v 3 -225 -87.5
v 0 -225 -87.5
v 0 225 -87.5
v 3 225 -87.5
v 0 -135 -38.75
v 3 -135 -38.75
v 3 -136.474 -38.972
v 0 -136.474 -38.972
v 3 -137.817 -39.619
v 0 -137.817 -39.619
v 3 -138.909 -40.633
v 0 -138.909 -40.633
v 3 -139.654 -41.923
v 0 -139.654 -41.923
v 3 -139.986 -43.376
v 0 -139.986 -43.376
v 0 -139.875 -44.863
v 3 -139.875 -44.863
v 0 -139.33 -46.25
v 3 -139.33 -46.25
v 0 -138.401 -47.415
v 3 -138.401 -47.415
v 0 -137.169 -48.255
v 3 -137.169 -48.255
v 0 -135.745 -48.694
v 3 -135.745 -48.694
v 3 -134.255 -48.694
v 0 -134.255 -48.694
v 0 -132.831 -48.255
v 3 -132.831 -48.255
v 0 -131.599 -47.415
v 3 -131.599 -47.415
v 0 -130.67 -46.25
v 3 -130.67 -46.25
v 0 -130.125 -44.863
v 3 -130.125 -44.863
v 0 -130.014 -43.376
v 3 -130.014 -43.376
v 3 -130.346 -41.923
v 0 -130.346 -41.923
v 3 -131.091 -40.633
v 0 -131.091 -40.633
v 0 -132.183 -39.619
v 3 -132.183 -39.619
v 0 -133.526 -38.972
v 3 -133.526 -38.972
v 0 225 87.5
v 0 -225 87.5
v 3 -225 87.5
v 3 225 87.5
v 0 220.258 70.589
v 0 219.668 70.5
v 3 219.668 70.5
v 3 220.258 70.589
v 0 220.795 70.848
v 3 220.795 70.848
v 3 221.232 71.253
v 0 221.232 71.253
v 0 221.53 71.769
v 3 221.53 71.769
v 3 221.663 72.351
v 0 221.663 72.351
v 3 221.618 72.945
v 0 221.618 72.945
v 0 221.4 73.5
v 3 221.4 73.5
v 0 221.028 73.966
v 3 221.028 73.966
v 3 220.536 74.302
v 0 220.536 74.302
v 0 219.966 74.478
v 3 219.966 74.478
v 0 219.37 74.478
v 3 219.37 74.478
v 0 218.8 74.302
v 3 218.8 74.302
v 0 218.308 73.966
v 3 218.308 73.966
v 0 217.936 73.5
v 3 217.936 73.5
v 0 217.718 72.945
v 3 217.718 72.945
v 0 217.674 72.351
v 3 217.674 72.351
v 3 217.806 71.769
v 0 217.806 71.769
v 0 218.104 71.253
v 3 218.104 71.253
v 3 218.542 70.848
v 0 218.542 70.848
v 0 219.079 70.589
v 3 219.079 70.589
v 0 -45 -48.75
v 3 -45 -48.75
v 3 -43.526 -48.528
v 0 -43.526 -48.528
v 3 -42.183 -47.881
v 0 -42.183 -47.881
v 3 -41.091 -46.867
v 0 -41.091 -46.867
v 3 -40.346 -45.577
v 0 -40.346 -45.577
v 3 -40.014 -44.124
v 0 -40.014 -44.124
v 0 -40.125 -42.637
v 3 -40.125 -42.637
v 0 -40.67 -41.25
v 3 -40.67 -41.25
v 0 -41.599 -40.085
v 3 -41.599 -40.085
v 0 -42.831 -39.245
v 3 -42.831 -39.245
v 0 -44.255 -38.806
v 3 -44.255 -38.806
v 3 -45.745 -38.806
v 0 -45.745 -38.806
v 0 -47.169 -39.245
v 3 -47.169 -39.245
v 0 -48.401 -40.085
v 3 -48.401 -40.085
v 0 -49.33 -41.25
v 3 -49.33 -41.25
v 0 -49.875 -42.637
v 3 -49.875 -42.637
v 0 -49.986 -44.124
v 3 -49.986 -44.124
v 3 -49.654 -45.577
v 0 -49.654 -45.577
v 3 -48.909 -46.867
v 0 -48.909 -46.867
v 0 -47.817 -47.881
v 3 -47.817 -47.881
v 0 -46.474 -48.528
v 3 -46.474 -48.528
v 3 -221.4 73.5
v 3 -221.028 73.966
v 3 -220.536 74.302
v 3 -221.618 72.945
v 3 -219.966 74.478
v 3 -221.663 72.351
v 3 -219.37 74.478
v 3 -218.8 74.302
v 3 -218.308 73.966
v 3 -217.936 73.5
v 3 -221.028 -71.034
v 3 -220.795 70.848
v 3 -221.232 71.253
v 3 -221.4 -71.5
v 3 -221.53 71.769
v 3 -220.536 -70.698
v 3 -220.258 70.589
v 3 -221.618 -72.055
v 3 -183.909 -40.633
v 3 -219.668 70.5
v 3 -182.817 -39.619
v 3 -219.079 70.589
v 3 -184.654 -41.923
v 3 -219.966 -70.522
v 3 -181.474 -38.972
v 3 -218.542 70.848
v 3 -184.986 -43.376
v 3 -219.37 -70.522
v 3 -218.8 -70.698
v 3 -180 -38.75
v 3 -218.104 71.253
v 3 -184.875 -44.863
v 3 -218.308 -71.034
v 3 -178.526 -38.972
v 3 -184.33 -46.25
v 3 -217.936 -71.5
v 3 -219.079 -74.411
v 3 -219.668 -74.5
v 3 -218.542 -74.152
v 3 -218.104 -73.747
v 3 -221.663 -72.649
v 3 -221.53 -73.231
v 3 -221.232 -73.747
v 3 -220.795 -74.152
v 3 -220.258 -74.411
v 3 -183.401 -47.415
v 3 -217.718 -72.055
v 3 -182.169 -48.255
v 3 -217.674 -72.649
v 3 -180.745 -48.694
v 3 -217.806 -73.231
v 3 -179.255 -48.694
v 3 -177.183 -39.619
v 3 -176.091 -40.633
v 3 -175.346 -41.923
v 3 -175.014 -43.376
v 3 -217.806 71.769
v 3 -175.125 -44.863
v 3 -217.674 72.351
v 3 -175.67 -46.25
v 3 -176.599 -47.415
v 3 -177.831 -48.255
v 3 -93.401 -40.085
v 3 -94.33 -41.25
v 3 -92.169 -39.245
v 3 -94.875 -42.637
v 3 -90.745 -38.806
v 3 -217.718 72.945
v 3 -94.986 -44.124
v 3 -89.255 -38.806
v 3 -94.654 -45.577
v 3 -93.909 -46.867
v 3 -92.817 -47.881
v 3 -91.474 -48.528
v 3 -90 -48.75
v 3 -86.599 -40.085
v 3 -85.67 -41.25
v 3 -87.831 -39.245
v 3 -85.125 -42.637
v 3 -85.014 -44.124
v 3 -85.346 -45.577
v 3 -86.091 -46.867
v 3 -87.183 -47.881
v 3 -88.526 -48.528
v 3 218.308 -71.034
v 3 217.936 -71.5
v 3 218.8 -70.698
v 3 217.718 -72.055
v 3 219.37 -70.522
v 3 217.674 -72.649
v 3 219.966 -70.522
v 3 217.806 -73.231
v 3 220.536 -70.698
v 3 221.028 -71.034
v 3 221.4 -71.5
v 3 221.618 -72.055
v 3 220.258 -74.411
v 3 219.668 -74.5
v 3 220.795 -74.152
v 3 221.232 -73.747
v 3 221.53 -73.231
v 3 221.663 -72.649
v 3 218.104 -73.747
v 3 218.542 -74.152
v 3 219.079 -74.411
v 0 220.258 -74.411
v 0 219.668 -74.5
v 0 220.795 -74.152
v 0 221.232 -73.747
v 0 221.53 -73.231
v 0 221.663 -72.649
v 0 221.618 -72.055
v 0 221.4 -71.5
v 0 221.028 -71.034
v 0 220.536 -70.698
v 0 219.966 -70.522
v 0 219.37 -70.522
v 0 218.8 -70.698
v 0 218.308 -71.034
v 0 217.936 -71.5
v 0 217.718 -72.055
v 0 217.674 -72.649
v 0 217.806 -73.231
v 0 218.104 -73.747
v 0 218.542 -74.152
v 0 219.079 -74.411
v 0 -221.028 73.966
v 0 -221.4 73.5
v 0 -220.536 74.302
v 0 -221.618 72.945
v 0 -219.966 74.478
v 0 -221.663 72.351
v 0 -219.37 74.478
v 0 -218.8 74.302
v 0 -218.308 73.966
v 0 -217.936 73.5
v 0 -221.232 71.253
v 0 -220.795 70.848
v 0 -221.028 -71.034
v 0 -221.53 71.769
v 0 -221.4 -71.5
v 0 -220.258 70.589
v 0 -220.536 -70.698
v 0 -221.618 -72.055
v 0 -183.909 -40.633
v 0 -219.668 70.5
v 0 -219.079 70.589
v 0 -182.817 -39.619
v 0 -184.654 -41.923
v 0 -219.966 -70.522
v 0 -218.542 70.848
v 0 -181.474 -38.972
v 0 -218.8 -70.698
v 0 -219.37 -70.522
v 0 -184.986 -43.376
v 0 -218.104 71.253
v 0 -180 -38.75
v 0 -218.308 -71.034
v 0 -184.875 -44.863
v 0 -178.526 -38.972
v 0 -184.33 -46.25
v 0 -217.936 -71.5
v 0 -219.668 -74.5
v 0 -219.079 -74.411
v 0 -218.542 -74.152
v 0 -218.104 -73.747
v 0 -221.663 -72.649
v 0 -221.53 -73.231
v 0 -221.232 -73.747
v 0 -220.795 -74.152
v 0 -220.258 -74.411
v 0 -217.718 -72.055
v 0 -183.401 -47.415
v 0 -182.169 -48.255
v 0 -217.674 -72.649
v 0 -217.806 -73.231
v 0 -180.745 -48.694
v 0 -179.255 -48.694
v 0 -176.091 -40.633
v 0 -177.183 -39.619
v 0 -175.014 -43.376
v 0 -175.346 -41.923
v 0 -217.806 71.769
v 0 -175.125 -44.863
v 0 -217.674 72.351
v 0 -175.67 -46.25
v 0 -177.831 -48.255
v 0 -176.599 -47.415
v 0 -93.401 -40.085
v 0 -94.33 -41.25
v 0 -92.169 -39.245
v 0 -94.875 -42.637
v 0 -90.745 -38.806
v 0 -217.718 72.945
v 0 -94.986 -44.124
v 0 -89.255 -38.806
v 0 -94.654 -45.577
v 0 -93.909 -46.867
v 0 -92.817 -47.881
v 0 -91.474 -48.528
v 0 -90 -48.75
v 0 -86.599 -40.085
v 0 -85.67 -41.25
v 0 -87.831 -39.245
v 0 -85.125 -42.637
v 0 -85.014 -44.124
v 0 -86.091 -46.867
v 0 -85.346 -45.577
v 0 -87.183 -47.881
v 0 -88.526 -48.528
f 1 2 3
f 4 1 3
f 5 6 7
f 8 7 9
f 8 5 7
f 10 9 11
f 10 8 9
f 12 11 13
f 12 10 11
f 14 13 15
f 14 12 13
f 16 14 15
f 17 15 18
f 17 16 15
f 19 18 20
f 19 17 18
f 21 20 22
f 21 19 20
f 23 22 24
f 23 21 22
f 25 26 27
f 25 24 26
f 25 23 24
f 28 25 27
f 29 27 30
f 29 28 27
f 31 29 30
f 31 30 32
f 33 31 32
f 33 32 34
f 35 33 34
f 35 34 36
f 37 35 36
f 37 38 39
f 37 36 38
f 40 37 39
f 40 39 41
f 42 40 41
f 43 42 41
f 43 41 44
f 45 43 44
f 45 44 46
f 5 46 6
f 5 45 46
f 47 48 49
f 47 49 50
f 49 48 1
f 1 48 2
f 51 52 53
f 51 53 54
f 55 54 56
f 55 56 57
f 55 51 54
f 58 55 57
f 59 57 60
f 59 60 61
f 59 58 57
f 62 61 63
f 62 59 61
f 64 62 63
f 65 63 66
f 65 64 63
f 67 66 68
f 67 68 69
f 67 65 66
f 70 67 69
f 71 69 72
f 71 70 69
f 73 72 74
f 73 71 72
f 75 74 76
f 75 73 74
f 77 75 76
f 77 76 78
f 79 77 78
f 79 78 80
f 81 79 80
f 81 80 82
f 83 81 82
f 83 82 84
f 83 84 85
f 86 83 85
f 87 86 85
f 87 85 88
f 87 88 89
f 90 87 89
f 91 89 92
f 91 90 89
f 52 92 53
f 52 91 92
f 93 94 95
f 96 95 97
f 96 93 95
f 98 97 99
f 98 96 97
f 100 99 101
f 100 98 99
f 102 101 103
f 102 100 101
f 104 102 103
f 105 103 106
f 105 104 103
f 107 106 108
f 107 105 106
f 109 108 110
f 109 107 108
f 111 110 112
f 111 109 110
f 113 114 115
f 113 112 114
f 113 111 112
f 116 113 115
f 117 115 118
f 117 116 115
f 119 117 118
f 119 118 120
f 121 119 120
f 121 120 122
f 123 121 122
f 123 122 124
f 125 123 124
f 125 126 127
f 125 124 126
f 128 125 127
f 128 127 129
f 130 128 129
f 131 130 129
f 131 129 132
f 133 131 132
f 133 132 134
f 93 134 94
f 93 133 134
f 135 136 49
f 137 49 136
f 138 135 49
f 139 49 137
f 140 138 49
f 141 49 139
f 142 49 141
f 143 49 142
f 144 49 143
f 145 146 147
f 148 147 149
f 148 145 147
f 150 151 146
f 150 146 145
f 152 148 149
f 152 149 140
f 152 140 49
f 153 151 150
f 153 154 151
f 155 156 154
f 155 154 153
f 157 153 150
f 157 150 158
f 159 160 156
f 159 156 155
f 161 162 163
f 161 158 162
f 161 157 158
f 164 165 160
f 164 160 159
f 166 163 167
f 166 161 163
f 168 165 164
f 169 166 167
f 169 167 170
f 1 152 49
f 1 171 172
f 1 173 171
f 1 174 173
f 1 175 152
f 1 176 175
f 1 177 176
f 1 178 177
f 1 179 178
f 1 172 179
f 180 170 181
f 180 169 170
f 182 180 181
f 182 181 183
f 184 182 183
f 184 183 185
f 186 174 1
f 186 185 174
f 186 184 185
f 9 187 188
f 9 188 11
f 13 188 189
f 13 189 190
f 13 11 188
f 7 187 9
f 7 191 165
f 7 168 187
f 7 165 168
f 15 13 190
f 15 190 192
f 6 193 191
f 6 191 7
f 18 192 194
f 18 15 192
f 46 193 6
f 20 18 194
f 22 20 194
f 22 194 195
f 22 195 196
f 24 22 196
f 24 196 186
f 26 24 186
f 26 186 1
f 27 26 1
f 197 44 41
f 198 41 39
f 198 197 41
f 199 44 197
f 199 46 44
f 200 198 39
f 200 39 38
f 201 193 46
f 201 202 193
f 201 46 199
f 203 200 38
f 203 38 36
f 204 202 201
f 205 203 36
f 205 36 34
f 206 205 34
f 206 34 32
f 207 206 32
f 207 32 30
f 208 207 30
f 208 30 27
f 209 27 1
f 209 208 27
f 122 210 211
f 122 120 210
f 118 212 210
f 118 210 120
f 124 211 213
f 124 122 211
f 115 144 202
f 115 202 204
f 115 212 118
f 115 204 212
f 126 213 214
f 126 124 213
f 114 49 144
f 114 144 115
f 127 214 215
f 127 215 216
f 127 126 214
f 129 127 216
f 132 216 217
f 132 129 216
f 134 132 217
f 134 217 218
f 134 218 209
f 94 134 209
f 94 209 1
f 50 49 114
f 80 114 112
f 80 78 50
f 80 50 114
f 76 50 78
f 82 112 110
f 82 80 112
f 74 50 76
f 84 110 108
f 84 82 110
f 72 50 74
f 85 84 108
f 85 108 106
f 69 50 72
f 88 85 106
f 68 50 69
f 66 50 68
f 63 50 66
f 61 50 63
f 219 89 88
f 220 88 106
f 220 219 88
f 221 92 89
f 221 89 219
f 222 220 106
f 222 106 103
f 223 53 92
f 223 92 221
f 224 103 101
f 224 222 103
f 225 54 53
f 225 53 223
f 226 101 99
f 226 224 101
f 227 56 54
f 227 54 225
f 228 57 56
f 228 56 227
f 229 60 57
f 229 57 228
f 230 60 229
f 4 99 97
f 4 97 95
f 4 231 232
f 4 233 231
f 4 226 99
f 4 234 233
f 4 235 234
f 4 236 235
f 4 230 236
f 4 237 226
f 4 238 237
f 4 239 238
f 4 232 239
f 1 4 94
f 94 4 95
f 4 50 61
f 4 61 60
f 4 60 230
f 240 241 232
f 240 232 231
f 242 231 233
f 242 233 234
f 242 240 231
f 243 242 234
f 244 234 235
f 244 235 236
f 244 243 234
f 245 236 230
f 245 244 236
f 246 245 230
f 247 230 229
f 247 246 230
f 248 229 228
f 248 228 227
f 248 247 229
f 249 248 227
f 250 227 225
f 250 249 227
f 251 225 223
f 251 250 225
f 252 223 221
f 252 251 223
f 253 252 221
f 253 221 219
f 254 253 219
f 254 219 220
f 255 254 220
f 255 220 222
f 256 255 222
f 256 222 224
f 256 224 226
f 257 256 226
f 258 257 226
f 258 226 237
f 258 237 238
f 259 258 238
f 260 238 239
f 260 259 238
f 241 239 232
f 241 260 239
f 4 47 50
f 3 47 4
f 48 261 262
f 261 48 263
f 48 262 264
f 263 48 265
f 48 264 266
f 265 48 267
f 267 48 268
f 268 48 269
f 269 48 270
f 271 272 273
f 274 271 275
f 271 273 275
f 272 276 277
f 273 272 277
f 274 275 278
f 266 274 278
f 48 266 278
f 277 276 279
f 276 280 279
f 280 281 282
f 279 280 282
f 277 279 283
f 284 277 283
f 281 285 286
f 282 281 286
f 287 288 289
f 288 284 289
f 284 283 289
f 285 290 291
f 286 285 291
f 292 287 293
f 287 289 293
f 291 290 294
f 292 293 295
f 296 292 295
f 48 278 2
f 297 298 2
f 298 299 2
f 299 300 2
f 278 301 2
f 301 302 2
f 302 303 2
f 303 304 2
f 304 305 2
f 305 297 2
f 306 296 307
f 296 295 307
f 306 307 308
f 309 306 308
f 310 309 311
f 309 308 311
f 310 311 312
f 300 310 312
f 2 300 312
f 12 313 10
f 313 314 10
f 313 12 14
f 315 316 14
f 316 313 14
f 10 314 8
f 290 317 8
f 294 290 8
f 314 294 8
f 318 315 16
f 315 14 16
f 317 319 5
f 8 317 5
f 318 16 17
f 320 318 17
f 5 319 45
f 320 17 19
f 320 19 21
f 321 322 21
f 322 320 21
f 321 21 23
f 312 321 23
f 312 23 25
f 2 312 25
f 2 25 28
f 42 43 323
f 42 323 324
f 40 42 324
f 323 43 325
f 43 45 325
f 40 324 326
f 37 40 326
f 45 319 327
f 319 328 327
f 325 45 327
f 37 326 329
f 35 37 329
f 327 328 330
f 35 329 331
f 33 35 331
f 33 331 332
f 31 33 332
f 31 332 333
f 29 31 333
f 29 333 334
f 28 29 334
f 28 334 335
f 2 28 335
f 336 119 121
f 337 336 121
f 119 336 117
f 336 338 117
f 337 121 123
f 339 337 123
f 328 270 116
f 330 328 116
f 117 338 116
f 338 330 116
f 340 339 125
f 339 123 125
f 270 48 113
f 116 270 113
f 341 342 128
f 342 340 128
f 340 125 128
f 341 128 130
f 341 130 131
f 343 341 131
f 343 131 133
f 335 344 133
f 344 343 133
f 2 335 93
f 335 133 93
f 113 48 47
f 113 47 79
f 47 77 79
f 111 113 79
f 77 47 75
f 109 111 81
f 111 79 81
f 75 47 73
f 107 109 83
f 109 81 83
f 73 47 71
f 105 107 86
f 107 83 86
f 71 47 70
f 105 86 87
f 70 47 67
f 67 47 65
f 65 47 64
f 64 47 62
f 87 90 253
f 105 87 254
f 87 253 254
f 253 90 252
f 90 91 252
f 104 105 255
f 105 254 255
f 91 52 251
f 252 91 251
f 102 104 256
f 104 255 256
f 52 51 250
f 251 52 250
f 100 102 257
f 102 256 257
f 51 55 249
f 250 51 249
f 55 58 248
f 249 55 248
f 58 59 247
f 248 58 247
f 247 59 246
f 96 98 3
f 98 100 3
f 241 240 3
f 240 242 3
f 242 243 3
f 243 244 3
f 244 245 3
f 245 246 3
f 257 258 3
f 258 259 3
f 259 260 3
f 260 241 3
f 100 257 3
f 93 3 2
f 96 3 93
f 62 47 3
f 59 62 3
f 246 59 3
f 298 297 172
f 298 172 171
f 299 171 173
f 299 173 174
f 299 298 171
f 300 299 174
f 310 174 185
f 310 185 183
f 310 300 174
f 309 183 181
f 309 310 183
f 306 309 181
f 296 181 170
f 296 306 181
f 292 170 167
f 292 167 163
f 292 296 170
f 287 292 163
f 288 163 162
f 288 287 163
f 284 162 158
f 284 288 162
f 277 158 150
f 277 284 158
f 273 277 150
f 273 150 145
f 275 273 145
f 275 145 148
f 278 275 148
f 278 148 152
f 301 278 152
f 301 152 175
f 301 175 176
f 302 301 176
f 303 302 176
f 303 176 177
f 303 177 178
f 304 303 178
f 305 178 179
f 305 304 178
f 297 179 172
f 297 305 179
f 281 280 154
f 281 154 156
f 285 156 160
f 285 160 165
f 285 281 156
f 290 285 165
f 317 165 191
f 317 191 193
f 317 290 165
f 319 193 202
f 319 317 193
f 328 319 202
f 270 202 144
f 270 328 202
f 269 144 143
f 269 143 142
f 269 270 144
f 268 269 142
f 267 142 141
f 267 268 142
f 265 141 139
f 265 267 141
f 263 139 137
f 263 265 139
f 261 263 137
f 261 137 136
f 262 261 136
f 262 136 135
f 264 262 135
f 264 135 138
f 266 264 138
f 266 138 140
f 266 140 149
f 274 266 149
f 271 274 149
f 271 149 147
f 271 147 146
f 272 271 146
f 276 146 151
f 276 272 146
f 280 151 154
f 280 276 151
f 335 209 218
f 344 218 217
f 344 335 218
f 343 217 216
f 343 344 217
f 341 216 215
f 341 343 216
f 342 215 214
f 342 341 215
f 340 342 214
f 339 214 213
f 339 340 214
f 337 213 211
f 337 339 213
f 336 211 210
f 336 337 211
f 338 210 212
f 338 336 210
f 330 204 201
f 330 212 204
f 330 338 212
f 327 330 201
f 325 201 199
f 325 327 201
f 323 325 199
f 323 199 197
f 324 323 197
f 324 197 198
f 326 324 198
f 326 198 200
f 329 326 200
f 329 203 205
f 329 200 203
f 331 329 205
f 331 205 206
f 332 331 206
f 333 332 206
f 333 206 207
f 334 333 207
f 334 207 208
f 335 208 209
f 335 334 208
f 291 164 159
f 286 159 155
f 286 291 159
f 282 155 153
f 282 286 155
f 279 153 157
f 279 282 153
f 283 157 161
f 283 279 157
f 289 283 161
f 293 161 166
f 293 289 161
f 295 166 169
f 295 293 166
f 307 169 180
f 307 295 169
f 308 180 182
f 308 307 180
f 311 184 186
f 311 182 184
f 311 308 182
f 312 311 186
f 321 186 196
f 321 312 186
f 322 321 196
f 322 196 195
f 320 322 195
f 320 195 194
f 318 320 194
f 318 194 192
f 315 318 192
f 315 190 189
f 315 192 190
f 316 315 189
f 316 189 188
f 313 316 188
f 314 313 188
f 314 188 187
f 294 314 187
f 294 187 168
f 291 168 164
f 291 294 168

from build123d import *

# Parameters (mm, degrees)
SKETCH1_W           = 175
SKETCH1_H           = 450
SKETCH1_R           = 2
BOSS_EXTRUDE1_DEPTH = 3
SKETCH2_R           = 5
RCA_HOLES_DEPTH     = 242.433738322


with BuildPart() as part:
    # Sketch1 → Boss-Extrude1 (new body)
    with BuildSketch(Plane(origin=(0, 0, 0), x_dir=(0, 0, -1), z_dir=(1, 0, 0))):
        Rectangle(SKETCH1_W, SKETCH1_H)
        with Locations((-72.5, 219.66814109)):
            Circle(SKETCH1_R, mode=Mode.SUBTRACT)
        with Locations((72.5, 219.66814109)):
            Circle(SKETCH1_R, mode=Mode.SUBTRACT)
        with Locations((72.5, -219.66814109)):
            Circle(SKETCH1_R, mode=Mode.SUBTRACT)
        with Locations((-72.5, -219.66814109)):
            Circle(SKETCH1_R, mode=Mode.SUBTRACT)
    extrude(amount=BOSS_EXTRUDE1_DEPTH)

    # Sketch2 → RCA_Holes (cut, through all)
    with BuildSketch(Plane(origin=(0, 0, 0), x_dir=(0, 0, -1), z_dir=(1, 0, 0))):
        with Locations((43.75, -90)):
            Circle(SKETCH2_R)
        with Locations((43.75, -45)):
            Circle(SKETCH2_R)
        with Locations(Location((43.75, -135, 0), (0, 0, 180))):
            Circle(SKETCH2_R)
        with Locations(Location((43.75, -180, 0), (0, 0, 180))):
            Circle(SKETCH2_R)
    extrude(amount=RCA_HOLES_DEPTH, mode=Mode.SUBTRACT)


solid = part.part
